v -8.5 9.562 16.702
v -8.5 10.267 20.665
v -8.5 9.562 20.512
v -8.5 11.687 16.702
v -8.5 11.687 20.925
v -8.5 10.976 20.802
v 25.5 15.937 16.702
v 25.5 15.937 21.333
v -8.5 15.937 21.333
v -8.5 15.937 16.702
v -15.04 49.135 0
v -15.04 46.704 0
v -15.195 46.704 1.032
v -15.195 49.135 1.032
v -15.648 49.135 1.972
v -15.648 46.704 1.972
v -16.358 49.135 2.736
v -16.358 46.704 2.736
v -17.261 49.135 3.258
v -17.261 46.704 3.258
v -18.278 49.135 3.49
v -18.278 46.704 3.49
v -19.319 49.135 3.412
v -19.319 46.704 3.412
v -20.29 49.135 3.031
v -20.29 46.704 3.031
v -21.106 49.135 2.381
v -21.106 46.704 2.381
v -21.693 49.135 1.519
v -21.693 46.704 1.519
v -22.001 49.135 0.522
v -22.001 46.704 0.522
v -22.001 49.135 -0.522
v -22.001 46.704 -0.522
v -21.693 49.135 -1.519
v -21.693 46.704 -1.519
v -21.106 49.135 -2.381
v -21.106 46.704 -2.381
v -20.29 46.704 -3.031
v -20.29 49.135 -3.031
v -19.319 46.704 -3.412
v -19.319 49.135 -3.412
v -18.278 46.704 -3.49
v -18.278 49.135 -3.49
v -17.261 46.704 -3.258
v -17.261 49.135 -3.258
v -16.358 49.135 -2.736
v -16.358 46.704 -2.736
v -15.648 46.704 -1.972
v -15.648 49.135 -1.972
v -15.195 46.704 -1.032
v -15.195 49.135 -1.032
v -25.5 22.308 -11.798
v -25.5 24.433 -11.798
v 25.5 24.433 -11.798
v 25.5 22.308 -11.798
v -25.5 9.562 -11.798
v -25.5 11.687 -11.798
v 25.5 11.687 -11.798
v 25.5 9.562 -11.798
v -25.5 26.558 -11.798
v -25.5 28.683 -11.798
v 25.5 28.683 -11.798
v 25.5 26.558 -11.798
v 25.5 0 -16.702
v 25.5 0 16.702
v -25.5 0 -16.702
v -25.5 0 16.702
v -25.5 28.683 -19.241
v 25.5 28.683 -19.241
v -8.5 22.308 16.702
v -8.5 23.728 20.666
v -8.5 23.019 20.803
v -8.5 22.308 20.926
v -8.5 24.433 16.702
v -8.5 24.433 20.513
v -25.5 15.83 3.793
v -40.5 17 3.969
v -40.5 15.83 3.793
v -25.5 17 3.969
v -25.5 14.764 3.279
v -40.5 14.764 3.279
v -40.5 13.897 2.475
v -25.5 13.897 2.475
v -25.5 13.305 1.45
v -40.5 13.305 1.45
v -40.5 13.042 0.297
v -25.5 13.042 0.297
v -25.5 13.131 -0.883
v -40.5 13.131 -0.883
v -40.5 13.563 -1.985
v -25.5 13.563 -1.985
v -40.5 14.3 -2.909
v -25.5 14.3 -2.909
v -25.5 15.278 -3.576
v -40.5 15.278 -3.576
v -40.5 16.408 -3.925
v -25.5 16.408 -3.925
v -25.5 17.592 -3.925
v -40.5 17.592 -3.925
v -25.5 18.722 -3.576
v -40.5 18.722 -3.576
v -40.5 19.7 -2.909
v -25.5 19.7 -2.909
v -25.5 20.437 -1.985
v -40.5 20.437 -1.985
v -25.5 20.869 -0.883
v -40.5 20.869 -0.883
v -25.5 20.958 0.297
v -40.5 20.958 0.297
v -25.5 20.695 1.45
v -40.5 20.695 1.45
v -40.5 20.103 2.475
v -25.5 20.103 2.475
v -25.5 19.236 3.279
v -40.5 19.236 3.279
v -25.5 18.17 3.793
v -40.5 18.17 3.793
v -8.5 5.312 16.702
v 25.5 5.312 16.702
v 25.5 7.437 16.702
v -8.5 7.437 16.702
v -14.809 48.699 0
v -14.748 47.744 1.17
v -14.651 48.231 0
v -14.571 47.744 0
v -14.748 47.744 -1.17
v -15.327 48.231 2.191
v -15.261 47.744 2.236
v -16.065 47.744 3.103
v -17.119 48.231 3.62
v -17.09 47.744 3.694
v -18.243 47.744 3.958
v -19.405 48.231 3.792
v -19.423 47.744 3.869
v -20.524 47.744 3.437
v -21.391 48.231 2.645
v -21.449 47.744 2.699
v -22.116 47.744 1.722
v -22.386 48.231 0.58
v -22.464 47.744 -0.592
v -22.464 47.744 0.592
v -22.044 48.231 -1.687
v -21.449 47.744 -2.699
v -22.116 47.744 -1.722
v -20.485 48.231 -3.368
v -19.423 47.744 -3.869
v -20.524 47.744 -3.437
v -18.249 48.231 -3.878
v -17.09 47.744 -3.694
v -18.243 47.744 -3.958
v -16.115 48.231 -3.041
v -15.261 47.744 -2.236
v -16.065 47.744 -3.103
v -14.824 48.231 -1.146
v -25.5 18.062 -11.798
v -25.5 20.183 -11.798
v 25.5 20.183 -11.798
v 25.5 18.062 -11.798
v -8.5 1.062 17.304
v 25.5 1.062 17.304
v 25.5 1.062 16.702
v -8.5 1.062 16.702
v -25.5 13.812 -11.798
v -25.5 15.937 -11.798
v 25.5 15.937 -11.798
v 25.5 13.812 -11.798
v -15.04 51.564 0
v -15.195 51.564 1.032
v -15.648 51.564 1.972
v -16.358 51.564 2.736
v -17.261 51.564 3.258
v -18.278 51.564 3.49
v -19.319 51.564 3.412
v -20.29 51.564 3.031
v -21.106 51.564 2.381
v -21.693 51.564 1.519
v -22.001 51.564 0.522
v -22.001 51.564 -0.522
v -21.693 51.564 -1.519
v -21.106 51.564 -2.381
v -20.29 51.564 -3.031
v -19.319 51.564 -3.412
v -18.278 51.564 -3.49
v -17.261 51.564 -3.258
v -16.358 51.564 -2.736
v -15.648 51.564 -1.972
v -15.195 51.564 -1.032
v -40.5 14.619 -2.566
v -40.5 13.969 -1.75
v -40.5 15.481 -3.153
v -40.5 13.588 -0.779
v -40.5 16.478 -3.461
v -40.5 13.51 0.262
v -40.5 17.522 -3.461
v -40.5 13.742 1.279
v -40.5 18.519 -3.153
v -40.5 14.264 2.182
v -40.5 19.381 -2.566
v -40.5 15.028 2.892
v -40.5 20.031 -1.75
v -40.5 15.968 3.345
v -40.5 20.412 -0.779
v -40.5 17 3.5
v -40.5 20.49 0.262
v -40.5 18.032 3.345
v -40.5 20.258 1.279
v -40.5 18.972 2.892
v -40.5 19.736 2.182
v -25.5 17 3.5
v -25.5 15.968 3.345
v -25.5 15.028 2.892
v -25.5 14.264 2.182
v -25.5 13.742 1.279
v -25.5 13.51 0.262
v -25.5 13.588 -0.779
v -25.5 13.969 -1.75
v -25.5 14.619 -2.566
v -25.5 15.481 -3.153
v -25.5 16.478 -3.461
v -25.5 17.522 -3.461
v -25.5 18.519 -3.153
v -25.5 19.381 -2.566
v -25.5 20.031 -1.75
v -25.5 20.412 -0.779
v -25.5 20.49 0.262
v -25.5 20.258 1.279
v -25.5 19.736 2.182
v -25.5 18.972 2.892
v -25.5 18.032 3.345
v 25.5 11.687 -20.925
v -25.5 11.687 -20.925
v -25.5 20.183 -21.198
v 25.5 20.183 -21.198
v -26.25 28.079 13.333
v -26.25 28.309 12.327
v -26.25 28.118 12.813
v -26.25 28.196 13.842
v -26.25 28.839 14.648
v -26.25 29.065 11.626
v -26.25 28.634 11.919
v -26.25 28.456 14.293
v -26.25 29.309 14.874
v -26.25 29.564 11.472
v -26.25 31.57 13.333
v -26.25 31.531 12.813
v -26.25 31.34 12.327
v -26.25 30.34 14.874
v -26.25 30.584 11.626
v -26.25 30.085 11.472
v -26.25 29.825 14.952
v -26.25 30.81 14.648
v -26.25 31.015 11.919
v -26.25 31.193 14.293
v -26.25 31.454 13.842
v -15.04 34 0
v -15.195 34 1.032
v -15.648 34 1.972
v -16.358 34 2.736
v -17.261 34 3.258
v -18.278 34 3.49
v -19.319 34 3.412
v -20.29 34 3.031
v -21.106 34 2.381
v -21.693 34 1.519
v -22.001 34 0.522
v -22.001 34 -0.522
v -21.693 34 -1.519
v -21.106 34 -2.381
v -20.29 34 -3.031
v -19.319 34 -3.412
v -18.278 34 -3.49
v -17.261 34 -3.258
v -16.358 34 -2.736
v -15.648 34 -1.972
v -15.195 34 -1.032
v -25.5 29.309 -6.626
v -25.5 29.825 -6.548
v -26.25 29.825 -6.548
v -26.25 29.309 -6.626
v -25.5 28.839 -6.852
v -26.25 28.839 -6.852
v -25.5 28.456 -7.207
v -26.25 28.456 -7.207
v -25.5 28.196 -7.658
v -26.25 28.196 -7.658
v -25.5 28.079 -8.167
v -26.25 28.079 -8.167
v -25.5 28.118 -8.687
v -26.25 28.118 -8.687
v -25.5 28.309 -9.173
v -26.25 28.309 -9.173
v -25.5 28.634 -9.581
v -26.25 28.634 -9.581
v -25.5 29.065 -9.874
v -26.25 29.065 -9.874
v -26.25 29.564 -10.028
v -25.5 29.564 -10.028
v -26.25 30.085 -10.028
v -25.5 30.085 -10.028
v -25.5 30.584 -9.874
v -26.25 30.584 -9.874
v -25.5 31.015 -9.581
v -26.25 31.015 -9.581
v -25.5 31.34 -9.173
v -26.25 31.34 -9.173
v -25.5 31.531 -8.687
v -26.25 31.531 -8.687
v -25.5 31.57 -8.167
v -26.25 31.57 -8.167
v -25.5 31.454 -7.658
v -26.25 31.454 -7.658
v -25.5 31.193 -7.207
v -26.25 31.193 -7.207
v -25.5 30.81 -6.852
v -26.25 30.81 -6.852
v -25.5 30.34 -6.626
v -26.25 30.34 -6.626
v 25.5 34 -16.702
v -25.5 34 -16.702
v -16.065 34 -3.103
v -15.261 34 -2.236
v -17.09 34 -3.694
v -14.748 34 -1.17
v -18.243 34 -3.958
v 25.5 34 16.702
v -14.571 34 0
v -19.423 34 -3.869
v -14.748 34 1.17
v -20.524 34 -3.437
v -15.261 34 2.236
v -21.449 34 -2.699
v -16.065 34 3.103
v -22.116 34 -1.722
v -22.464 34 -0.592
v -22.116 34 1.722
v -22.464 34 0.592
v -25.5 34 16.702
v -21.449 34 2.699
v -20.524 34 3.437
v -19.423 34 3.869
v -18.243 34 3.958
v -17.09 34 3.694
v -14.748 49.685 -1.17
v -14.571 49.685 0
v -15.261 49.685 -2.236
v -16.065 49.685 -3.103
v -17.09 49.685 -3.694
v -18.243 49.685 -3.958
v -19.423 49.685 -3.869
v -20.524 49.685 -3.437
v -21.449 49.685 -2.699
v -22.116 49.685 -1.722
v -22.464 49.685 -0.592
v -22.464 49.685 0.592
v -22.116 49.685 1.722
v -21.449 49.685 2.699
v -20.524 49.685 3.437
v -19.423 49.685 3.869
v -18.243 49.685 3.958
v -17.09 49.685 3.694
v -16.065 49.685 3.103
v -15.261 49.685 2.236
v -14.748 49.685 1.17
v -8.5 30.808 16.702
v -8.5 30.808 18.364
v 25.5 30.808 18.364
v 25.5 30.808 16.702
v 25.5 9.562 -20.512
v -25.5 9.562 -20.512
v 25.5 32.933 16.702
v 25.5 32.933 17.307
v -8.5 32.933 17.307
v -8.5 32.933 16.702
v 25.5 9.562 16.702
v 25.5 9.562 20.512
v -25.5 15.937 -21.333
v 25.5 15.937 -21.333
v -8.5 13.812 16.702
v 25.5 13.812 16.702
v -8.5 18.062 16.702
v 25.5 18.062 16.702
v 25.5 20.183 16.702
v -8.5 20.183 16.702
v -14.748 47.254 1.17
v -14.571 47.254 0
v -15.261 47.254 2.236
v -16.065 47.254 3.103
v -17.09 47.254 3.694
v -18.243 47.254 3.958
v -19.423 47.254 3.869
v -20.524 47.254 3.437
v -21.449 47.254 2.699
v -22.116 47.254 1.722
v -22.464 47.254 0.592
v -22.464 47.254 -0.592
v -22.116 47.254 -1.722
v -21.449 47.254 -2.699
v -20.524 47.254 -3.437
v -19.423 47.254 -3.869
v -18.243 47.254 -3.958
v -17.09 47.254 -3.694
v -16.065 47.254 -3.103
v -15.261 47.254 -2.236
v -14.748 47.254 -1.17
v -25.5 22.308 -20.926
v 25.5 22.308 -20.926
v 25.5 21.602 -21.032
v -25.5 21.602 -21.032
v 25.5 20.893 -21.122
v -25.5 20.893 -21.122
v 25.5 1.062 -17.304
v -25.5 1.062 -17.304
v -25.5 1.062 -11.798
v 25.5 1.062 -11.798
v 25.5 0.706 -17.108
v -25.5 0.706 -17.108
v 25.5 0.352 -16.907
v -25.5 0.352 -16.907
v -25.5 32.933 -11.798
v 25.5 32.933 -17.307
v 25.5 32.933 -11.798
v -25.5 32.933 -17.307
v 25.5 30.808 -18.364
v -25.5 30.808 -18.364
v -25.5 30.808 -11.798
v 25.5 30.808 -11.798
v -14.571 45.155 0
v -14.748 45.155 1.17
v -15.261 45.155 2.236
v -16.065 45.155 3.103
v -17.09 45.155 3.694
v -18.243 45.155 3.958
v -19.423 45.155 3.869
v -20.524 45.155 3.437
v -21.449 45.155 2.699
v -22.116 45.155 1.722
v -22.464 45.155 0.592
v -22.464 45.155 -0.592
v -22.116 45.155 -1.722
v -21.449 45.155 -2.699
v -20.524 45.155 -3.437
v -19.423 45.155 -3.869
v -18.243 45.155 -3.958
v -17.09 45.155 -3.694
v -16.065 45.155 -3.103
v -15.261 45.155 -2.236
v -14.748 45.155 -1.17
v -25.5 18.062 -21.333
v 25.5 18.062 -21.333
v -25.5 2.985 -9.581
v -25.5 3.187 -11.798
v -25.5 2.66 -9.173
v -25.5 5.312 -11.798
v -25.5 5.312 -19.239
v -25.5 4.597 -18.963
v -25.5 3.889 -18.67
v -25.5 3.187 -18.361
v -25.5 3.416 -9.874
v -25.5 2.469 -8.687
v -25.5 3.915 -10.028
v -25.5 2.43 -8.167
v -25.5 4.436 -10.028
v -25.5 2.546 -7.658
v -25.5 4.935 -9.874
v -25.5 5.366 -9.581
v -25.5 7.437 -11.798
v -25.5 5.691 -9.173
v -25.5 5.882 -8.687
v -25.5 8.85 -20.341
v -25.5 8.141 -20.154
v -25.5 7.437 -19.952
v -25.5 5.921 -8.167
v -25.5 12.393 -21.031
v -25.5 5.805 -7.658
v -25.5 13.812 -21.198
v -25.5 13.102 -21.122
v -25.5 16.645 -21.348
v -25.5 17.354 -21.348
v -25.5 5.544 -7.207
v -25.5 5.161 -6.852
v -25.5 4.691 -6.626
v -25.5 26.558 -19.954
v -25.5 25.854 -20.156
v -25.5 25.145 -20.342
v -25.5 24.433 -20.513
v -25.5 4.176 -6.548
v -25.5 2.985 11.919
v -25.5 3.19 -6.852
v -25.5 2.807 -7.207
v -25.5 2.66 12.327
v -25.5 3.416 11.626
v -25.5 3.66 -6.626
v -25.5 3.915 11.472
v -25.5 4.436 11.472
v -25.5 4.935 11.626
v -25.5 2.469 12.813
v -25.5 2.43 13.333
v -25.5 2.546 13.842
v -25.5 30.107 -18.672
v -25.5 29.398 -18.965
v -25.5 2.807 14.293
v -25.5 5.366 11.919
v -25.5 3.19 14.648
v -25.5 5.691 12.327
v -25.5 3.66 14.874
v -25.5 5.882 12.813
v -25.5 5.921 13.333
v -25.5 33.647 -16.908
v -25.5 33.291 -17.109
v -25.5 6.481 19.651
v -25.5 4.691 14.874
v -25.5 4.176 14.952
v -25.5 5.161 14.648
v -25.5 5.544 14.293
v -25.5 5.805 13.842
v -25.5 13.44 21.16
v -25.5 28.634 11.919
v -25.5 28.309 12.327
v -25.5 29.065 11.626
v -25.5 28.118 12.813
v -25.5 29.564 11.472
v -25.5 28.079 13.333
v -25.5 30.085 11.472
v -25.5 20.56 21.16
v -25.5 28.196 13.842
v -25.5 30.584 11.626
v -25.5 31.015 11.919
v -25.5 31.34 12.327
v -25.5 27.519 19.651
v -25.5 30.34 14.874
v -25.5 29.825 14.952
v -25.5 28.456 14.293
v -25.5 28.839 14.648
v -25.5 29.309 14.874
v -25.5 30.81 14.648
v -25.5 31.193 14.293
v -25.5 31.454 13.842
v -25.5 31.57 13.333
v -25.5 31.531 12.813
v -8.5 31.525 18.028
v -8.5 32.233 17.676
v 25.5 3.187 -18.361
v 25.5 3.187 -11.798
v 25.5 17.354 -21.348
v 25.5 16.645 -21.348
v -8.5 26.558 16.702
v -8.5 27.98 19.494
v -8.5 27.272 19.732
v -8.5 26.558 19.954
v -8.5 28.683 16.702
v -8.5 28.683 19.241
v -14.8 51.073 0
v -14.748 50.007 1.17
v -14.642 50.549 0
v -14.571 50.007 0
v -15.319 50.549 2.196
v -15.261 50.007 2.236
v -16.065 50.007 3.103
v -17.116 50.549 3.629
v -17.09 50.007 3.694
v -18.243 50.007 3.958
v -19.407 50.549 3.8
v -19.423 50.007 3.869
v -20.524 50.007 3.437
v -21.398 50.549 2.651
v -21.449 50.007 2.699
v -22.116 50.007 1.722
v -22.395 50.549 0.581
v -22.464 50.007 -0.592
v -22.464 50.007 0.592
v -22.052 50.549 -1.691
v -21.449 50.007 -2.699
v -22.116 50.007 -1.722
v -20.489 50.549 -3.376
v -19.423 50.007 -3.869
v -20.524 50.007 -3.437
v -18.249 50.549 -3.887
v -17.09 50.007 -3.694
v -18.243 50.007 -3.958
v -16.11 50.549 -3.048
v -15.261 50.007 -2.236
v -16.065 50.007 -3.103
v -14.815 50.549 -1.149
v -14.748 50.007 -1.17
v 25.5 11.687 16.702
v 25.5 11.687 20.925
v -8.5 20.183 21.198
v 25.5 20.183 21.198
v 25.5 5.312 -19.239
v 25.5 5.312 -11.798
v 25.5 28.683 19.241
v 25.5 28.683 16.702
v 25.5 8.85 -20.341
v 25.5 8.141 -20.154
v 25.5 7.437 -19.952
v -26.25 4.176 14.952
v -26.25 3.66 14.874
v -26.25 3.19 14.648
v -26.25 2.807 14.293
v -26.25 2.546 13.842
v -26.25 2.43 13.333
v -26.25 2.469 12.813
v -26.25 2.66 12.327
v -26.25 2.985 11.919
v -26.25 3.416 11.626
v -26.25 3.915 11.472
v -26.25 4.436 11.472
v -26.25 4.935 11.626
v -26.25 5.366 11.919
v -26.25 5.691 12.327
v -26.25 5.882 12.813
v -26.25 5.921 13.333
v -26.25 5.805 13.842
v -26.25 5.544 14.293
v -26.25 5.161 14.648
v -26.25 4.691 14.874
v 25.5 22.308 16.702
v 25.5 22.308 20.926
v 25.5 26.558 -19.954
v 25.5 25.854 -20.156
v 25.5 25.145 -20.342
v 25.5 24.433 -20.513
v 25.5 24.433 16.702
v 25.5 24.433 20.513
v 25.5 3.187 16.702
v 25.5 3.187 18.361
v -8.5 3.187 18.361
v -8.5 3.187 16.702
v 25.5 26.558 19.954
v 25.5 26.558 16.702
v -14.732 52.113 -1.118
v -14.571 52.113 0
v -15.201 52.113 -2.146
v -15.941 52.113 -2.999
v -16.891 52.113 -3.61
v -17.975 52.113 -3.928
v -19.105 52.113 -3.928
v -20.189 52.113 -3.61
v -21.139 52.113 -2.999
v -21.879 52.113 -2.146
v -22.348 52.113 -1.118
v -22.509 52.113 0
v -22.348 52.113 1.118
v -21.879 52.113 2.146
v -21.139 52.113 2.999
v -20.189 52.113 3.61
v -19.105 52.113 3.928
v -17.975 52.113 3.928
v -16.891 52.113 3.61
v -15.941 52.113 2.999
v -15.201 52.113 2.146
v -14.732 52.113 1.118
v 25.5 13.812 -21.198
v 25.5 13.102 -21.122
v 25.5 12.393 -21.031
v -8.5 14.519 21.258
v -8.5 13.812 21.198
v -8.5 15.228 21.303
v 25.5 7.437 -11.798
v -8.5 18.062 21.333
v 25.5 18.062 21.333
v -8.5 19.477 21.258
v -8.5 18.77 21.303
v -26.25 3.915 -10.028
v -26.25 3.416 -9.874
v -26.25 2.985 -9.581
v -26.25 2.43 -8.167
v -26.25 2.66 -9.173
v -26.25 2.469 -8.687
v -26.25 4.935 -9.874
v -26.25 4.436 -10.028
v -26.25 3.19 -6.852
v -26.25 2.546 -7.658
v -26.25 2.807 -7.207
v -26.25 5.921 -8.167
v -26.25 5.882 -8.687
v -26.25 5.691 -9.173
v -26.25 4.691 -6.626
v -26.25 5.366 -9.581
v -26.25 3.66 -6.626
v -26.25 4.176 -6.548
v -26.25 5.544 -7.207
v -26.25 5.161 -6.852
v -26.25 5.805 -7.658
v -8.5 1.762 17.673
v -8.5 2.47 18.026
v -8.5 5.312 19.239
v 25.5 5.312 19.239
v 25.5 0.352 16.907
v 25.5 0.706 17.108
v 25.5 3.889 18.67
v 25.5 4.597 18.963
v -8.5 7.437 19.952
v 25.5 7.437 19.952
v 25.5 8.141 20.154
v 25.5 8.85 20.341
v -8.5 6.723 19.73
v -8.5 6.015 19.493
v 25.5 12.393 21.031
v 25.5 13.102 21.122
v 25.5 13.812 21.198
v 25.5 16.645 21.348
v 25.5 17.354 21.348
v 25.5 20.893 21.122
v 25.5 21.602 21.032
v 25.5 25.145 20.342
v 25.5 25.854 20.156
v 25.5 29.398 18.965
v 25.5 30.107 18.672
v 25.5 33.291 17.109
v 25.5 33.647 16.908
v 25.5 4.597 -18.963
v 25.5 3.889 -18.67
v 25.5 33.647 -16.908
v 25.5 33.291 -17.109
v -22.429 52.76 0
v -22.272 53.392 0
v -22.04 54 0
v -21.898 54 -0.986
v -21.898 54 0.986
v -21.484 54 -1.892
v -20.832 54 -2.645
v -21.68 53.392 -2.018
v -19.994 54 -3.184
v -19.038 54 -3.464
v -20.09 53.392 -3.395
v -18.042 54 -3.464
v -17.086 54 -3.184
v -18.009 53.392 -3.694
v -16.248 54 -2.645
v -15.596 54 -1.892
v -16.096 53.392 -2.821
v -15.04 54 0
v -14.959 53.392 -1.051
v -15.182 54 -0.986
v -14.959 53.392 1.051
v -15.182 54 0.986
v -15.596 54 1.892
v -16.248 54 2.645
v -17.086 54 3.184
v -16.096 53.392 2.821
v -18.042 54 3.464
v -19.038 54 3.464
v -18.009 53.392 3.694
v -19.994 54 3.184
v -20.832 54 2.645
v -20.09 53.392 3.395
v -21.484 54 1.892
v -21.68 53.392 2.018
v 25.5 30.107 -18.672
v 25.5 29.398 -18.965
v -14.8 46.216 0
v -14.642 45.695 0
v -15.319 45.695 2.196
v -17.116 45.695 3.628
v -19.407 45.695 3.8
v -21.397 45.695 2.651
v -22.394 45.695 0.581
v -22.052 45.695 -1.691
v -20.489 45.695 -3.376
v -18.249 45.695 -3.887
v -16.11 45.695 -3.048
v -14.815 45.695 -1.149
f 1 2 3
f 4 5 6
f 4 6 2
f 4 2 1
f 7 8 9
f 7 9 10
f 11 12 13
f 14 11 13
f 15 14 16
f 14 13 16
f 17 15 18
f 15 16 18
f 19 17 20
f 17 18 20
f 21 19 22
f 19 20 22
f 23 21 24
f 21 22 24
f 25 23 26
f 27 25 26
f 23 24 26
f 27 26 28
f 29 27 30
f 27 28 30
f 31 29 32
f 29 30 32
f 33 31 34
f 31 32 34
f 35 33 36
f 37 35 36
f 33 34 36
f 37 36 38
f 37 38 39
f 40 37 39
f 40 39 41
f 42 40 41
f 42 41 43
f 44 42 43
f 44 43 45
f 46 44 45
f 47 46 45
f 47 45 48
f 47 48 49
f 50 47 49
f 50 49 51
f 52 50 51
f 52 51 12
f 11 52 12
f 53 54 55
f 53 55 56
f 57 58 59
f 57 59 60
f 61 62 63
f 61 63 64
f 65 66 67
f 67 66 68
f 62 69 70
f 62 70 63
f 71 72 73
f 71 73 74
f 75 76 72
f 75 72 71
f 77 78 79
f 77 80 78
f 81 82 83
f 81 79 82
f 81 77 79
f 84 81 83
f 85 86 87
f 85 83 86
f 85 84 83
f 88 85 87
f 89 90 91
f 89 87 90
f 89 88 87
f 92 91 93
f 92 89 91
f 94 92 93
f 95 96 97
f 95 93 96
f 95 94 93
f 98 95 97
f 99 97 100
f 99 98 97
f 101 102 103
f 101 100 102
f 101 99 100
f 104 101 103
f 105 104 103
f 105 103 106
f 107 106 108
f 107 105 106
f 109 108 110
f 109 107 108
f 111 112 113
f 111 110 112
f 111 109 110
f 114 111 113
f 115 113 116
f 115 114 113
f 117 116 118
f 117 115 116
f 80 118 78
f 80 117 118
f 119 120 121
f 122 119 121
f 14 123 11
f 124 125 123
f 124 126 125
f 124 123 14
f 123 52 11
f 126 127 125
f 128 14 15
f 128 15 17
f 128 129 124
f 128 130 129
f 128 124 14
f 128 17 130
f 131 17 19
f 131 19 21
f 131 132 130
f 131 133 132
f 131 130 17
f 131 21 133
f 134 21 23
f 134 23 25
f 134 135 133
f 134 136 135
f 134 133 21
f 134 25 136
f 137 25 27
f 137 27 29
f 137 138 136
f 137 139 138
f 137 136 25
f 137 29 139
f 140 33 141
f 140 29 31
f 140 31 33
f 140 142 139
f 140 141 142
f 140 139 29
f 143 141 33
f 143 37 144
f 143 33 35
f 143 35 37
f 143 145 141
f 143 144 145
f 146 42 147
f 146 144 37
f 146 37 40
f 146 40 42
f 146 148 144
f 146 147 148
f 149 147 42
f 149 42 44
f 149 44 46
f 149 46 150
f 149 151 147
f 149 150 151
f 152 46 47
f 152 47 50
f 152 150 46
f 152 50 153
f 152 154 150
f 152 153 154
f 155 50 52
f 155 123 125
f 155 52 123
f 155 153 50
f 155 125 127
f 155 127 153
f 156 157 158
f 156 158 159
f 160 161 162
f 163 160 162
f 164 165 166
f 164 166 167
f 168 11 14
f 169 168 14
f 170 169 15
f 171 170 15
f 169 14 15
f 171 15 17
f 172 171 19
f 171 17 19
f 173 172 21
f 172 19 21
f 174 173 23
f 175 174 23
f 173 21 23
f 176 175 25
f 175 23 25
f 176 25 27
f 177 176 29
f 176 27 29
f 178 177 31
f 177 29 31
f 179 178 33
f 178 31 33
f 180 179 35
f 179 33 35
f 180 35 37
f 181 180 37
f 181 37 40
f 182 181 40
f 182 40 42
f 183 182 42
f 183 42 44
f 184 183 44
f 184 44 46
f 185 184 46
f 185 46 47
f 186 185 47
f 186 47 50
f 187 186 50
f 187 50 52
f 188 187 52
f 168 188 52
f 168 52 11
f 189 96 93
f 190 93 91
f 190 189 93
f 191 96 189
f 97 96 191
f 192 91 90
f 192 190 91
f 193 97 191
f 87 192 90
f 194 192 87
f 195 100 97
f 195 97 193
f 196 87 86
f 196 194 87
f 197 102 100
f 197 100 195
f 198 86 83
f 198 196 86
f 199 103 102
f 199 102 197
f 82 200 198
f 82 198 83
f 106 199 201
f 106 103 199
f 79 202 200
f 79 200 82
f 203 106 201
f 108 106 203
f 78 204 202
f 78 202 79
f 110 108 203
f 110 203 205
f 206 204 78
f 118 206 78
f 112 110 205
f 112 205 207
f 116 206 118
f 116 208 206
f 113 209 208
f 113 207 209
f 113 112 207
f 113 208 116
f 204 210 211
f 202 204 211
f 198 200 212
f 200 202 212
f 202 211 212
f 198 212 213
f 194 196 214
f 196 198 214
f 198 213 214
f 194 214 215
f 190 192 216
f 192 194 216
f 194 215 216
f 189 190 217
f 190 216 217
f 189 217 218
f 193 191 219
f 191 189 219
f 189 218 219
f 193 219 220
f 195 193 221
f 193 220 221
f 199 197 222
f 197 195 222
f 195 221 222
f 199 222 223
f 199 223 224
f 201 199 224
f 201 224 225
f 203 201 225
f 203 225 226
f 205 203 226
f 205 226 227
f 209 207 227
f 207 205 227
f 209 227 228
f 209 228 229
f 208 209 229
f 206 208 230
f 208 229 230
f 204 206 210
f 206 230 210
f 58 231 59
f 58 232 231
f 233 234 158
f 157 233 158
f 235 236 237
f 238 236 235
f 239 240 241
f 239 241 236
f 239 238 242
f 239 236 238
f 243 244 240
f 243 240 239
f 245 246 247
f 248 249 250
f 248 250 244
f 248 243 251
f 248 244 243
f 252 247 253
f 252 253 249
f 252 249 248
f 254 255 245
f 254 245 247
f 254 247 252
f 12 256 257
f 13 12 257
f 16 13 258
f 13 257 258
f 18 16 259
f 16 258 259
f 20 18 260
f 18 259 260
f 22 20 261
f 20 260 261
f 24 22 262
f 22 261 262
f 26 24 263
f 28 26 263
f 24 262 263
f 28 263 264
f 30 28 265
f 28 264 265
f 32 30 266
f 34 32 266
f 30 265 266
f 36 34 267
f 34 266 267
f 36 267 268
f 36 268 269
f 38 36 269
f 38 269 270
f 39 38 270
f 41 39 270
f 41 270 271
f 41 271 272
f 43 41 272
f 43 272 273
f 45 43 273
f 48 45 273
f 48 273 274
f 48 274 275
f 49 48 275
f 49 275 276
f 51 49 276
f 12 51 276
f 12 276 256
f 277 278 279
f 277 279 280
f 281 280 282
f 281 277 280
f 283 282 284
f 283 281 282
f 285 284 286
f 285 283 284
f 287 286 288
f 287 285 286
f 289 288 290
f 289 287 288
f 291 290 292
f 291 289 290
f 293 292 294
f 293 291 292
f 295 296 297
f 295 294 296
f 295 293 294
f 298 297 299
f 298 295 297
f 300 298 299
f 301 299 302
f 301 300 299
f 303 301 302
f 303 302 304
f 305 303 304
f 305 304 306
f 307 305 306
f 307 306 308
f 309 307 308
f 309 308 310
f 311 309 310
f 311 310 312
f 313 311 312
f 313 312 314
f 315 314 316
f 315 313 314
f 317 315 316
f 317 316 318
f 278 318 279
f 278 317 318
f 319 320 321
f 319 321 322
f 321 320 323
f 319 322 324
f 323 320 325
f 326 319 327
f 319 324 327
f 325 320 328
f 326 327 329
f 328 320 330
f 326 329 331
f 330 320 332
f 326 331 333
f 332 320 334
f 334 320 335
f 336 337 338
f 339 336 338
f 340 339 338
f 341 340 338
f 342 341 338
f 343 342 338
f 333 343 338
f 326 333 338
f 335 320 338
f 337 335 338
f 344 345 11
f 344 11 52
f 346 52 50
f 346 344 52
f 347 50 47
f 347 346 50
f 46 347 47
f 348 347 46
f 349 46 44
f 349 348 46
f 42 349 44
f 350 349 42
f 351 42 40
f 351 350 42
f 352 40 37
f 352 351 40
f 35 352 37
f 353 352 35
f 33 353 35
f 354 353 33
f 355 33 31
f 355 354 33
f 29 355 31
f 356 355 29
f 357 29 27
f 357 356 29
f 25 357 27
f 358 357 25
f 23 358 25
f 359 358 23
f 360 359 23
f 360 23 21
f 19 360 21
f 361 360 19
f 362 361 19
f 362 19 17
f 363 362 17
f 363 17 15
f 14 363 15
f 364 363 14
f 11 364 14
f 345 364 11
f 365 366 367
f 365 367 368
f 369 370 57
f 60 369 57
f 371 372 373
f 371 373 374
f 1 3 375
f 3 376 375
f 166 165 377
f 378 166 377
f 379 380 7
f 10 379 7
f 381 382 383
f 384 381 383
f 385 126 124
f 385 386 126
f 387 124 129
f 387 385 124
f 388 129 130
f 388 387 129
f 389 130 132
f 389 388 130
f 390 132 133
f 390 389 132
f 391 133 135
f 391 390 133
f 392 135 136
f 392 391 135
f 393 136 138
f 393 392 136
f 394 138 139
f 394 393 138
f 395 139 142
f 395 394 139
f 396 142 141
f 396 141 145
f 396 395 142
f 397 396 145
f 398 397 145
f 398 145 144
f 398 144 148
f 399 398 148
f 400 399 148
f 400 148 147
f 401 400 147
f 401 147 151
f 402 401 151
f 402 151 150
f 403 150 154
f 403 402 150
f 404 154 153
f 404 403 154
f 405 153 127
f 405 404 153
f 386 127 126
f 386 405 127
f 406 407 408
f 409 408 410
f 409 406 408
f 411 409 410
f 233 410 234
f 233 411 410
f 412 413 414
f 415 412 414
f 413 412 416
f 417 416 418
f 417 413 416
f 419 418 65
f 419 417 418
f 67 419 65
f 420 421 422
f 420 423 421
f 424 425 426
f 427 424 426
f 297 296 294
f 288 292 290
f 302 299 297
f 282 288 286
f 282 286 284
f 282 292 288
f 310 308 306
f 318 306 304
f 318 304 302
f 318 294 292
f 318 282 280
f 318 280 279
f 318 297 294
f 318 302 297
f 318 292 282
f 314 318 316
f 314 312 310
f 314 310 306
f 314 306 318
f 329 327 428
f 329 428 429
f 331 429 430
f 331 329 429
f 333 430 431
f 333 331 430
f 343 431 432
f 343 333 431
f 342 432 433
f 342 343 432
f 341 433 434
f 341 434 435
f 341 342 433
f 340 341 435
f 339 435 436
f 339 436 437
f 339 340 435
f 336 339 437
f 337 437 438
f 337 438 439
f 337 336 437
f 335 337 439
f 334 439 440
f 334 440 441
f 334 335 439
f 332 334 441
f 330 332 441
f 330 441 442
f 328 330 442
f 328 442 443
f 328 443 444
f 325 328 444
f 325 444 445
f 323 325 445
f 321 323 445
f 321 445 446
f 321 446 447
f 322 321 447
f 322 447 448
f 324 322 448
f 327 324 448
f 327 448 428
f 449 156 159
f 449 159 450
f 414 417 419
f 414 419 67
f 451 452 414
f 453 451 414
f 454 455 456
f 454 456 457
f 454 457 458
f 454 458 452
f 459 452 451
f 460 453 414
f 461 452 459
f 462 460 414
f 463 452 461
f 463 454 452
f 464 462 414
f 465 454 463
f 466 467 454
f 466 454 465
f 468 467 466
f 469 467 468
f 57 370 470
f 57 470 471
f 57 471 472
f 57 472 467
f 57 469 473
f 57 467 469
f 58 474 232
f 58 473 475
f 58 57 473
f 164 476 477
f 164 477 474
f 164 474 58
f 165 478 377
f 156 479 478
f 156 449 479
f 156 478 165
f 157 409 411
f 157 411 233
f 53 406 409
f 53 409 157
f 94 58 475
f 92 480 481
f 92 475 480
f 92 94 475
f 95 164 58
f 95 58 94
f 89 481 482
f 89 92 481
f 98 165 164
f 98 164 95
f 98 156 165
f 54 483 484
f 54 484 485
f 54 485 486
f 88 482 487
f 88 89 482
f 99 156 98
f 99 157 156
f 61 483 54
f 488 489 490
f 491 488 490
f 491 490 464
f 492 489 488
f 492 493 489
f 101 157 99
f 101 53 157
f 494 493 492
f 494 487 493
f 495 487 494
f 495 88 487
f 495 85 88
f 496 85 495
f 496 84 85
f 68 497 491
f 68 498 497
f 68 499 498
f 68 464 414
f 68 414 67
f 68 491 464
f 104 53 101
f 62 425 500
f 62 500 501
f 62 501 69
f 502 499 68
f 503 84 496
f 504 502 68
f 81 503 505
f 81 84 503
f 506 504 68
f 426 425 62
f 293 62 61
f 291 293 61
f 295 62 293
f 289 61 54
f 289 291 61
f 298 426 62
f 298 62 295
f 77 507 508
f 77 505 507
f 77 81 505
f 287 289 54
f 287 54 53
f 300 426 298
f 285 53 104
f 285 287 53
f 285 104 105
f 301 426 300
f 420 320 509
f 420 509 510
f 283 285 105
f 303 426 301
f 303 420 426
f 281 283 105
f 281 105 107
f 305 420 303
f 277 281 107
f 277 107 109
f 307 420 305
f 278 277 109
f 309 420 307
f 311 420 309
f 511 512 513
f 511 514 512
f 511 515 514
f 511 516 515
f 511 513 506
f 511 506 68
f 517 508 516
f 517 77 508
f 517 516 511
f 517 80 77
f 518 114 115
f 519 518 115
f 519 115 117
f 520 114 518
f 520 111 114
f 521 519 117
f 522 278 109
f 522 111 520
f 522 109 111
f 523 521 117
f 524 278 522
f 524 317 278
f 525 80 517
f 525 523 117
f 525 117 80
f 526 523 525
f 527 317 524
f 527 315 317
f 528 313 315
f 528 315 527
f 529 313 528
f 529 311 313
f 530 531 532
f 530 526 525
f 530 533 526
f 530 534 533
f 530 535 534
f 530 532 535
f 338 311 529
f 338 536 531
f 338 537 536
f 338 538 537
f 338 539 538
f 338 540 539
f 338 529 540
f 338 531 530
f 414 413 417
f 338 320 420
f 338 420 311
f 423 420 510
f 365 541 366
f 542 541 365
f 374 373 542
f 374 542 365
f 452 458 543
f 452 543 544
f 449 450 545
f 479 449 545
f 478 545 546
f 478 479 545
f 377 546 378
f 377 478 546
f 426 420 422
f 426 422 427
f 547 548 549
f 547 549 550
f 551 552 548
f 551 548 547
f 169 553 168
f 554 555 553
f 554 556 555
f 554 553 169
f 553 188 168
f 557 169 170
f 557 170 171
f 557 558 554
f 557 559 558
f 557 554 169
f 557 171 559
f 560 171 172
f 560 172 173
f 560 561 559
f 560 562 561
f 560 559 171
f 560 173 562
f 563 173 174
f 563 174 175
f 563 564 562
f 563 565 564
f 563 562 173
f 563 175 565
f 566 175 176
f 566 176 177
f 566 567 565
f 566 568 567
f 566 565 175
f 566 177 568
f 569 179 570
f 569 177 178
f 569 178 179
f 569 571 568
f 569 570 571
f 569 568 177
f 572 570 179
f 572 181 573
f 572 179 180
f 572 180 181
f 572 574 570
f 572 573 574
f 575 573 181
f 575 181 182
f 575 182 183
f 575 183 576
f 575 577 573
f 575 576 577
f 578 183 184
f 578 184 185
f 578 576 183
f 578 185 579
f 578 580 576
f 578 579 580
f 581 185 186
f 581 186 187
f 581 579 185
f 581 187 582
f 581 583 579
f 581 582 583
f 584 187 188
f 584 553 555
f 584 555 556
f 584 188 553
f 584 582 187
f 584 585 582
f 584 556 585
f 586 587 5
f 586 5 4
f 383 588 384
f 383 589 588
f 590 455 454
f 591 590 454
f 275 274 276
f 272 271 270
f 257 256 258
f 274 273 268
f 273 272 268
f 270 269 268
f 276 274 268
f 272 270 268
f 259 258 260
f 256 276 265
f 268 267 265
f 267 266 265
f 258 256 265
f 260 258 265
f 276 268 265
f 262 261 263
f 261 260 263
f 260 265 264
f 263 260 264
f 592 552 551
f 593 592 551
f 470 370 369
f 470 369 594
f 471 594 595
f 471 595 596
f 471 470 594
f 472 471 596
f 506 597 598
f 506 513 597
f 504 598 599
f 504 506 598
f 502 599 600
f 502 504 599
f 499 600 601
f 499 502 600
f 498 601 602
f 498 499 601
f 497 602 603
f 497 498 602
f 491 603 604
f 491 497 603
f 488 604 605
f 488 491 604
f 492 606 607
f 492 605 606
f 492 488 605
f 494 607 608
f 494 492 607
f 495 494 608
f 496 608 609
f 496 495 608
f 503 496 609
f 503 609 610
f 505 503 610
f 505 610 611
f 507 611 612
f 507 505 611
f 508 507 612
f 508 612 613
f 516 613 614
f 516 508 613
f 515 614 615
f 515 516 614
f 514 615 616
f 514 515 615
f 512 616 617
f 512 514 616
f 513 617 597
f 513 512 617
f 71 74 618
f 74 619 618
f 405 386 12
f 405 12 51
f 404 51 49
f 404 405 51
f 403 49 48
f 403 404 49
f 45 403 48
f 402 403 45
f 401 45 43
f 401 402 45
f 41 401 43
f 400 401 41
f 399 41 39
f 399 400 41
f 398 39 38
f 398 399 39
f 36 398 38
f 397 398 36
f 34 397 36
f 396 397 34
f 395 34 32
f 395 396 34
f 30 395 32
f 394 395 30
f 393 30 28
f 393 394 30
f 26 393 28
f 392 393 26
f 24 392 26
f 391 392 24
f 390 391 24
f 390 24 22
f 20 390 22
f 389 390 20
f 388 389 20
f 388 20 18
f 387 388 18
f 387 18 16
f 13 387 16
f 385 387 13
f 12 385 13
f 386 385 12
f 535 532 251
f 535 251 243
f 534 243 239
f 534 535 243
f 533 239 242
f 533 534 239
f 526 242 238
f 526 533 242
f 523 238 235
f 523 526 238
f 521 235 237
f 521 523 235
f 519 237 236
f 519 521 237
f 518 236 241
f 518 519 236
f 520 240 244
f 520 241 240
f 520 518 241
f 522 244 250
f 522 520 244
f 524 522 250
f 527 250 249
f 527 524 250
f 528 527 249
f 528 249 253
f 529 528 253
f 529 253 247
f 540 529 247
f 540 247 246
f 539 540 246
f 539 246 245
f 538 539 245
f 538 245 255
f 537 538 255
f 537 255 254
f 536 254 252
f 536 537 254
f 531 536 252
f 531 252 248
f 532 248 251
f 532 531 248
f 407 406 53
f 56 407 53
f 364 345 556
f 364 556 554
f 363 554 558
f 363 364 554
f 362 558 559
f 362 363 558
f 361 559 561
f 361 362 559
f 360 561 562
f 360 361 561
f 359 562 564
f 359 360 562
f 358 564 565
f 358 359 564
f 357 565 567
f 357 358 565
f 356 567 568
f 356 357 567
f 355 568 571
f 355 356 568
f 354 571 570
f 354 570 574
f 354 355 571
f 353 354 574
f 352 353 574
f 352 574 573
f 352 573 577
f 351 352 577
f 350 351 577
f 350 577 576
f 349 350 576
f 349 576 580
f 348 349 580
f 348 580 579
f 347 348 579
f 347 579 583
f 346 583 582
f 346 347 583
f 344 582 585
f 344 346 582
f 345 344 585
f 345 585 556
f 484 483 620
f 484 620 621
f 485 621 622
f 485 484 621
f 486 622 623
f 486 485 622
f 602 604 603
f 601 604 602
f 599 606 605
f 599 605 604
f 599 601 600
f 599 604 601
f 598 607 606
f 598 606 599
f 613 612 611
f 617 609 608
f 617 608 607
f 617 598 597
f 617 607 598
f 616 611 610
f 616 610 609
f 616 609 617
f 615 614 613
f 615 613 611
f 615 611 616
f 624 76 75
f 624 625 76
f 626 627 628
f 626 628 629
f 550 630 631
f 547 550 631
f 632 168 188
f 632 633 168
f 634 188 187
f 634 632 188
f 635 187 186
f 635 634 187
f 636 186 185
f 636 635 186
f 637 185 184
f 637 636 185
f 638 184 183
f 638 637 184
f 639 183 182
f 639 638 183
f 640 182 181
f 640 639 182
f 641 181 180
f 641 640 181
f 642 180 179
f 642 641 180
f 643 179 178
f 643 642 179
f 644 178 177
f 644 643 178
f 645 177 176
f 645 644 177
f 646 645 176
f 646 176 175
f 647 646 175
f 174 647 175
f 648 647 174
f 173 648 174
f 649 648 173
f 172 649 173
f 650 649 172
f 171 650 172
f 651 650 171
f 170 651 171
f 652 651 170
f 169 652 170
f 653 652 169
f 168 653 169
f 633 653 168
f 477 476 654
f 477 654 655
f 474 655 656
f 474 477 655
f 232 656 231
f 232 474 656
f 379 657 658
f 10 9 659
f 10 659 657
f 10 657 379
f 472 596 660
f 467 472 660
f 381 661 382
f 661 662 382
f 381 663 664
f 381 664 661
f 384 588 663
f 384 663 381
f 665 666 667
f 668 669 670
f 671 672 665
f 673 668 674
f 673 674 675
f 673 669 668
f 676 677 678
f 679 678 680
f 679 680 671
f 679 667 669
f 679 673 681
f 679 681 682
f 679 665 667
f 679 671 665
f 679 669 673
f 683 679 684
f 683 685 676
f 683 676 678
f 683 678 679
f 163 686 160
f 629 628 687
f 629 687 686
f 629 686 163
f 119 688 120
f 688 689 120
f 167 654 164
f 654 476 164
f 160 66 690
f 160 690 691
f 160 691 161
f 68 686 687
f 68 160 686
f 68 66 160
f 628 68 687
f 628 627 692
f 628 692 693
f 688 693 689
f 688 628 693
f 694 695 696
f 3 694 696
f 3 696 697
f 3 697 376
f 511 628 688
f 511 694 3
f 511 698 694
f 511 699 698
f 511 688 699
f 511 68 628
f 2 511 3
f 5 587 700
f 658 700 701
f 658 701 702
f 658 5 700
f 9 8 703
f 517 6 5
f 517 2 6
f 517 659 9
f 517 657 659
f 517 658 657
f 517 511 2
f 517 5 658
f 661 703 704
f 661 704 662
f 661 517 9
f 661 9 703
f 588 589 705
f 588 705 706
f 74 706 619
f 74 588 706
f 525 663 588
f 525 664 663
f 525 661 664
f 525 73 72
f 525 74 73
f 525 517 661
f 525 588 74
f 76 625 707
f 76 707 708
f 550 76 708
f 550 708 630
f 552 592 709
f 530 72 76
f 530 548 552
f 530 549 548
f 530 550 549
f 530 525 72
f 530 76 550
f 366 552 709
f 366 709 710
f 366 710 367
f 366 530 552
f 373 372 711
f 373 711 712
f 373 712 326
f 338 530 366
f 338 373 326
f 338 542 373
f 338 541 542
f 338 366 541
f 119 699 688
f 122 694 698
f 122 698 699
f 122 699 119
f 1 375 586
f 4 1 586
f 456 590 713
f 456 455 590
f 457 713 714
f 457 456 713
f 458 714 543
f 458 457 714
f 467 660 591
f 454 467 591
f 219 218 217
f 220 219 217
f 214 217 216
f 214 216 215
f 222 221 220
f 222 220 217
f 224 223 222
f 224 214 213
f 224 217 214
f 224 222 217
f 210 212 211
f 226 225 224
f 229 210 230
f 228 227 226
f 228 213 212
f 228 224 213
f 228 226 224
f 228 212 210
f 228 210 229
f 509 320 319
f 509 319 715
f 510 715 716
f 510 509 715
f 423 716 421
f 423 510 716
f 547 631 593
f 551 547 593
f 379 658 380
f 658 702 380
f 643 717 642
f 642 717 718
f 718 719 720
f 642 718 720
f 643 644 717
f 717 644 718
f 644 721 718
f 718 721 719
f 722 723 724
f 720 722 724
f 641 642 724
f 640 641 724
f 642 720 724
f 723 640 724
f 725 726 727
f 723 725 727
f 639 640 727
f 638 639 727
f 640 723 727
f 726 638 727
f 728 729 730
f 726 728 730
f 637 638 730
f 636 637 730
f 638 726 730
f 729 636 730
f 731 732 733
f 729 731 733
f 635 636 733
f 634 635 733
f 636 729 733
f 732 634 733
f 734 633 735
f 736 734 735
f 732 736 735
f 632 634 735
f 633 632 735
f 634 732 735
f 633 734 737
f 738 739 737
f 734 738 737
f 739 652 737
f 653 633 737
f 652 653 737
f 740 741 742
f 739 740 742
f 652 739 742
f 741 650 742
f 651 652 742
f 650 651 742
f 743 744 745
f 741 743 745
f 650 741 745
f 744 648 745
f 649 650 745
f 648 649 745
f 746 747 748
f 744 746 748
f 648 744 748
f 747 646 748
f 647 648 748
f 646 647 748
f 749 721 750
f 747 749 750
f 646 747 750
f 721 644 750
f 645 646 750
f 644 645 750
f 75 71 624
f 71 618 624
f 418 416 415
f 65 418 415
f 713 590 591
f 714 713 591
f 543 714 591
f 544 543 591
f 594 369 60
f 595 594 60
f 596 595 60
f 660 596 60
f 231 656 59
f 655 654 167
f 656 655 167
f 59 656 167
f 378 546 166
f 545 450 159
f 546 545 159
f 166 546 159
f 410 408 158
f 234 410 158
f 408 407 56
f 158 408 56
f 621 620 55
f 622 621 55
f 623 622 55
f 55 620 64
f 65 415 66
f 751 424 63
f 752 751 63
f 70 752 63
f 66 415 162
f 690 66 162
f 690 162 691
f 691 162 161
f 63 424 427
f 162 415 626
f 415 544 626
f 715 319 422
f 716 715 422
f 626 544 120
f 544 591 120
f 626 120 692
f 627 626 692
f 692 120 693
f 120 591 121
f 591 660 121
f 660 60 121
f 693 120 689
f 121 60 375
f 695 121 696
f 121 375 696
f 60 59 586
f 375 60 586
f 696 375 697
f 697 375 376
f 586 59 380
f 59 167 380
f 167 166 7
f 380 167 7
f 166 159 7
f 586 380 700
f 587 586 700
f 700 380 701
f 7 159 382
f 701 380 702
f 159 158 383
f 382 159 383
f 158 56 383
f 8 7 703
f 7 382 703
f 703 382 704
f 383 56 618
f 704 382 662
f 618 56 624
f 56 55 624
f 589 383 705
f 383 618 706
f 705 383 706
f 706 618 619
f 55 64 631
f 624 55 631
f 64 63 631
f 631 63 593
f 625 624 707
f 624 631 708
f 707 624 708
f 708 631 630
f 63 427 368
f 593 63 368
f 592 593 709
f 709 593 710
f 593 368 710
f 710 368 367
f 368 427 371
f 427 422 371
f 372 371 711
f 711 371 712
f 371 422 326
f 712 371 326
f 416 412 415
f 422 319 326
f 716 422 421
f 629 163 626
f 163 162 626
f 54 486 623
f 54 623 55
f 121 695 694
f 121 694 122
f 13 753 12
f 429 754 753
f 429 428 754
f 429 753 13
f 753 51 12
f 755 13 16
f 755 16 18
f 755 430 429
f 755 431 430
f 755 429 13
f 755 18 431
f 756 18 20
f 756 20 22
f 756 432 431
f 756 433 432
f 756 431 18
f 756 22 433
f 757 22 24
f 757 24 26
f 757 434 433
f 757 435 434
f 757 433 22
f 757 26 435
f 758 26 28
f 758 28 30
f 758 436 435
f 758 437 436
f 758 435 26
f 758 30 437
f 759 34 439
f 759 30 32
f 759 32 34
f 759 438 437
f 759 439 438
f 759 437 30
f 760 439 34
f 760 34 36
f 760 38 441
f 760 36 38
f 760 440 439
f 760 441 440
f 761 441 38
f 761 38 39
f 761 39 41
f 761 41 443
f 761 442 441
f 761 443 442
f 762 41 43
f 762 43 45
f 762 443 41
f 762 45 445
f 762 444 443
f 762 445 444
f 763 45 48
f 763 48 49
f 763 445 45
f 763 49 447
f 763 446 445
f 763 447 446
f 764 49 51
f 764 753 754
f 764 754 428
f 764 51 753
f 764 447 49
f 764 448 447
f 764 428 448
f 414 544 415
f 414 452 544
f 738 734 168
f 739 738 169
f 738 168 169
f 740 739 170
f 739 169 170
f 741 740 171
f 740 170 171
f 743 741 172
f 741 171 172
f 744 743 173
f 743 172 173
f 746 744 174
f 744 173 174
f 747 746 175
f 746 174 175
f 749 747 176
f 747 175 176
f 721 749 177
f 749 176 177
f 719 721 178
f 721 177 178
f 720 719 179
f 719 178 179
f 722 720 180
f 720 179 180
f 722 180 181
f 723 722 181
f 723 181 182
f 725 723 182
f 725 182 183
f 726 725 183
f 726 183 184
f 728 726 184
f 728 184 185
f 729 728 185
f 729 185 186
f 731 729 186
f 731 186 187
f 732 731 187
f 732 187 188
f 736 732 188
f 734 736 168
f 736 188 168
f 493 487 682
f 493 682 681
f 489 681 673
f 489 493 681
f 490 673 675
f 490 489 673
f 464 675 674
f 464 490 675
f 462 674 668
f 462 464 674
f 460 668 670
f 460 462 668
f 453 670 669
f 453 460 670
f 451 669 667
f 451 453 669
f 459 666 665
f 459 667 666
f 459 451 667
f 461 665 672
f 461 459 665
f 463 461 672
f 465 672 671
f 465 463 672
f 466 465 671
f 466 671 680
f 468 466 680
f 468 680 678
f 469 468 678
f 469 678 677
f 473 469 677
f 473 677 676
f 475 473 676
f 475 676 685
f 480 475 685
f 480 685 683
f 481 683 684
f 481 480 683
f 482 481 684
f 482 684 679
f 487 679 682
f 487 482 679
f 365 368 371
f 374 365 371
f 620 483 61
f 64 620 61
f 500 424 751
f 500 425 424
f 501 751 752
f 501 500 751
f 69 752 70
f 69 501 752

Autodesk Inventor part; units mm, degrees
ref_plane "YZ Plane" through (0, 0, 0) normal (1, 0, 0) x (0, 1, 0)
ref_plane "XZ Plane" through (0, 0, 0) normal (0, 1, 0) x (-1, 0, 0)
sketch "Sketch1" plane through (0, 0, 0) normal (0, 1, 0) x (-1, 0, 0)
  line L0 (25.5, -21.35) -> (-25.5, -21.35)
  line L1 (-25.5, -21.35) -> (-25.5, 21.35)
  line L2 (-25.5, 21.35) -> (25.5, 21.35)
  line L3 (25.5, 21.35) -> (25.5, -21.35)
  line L4 (25.5, -21.35) -> (-25.5, 21.35) construction
  line L5 (-25.5, -21.35) -> (25.5, 21.35) construction
  point P0 (0, 0)
  dimension "d0" = 51
  dimension "d1" = 42.7
extrude "Extrusion1" add sketch "Sketch1" along normal blind 34
sketch "Sketch2" plane through (-25.5, 0, -21.35) normal (-1, 0, 0) x (0, 0, 1)
  line L0 (42.7, 0) -> (0, 0) projected
  line L1 (42.7, 0) -> (42.7, 34) projected
  line L2 (0, 34) -> (42.7, 34) projected
  line L3 (0, 0) -> (0, 34) projected
  arc A0 (38.0522, 0) -> (38.0522, 34) centre (9.2864, 17) ccw
  line L4 (0, 34) -> (42.7, 34) construction
  line L5 (21.35, 34) -> (21.35, 0) construction
  arc A1 (4.6478, 34) -> (4.6478, 0) centre (33.4136, 17) ccw
  line L6 (0, 17) -> (42.7, 17) construction
  line L7 (42.7, 0) -> (0, 0) construction
  line L8 (9.5522, 34) -> (9.5522, 0) construction
  line L9 (9.5522, 34) -> (9.5522, 0)
  line L10 (0, 0) -> (0, 34) construction
  line L11 (0.0169, 18.0624) -> (9.5522, 18.0624) construction
  line L12 (9.5522, 15.937) -> (0, 15.937) construction
  line L13 (9.5522, 18.0624) -> (0.0169, 18.0624)
  line L14 (9.5522, 15.937) -> (0.0169, 15.937)
  line L15 (0.152, 20.1831) -> (9.5522, 20.1831)
  line L16 (0.4243, 22.3081) -> (9.5522, 22.3081)
  line L17 (0.8373, 24.4331) -> (9.5522, 24.4331)
  line L18 (1.3962, 26.5581) -> (9.5522, 26.5581)
  line L19 (2.1091, 28.6831) -> (9.5522, 28.6831)
  line L20 (2.9865, 30.8081) -> (9.5522, 30.8081)
  line L21 (4.0434, 32.9331) -> (9.5522, 32.9331)
  line L22 (0.1524, 13.812) -> (9.5522, 13.812)
  line L23 (0.4251, 11.687) -> (9.5522, 11.687)
  line L24 (0.8384, 9.562) -> (9.5522, 9.562)
  line L25 (1.3977, 7.437) -> (9.5522, 7.437)
  line L26 (2.1109, 5.312) -> (9.5522, 5.312)
  line L27 (2.9888, 3.187) -> (9.5522, 3.187)
  line L28 (4.0461, 1.062) -> (9.5522, 1.062)
  line L29 (9.5522, 34) -> (0, 34)
  line L30 (0, 34) -> (0, 0)
  line L31 (0, 0) -> (4.6478, 0)
  line L32 (42.7, 0) -> (42.7, 34) projected
  line L33 (42.7, 0) -> (42.7, 34)
  line L34 (42.7, 34) -> (9.5522, 34)
  line L35 (42.7, 0) -> (0, 0)
  line L36 (4.6478, 34) -> (4.0434, 32.9331)
  dimension "d4" = 28.5
  dimension "d5" = 1.0625
  dimension "d6" = 1.063
  dimension "d7" = 2.125
  dimension "d8" = 2.125
  dimension "d9" = 2.125
  dimension "d10" = 2.125
  dimension "d11" = 2.125
  dimension "d12" = 2.125
  dimension "d13" = 2.125
  dimension "d14" = 2.125
  dimension "d15" = 2.125
  dimension "d16" = 2.125
  dimension "d17" = 2.125
  dimension "d18" = 2.125
  dimension "d19" = 2.125
  dimension "d20" = 2.125
  dimension "d21" = 1.062
  dimension "d22" = 1.0669
extrude "Extrusion2" cut sketch "Sketch2" against normal through all contours L0 L3 A1 | L28 A1 L27 L9 | L9 L21 L36 L2 | A1 L3 L2 | L9 L20 A1 L21 | L26 A1 L25 L9 | A1 L15 L9 L13 | L14 L9 L22 A1 | L9 L18 A1 L19 | L24 A1 L23 L9 | A1 L17 L9 L16
sketch "Sketch3" plane through (-25.5, 0, 21.35) normal (-1, 0, 0) x (0, 0, 1)
  line L0 (-38.6566, 32.9331) -> (-33.1478, 32.9331)
  line L1 (-33.1478, 34) -> (-33.1478, 30.8081) projected
  line L2 (0, 34) -> (-33.1478, 34) projected
  line L3 (-38.0522, 34) -> (-33.1478, 34)
  line L4 (-33.1478, 34) -> (-33.1478, 32.9331)
  arc A0 (-38.0522, 34) -> (-38.6566, 32.9331) centre (-9.2864, 17) ccw projected
  line L5 (-38.0522, 34) -> (-38.0522, 34)
  line L6 (-38.0522, 34) -> (-38.6566, 32.9331)
  point P0 (-21.35, 0)
extrude "Extrusion3" add sketch "Sketch3" against normal blind 51 contours L6 L3 L1 L0
sketch "Sketch4" plane through (-25.5, 0, 21.35) normal (0, 0, 1) x (1, 0, 0)
  line L0 (51, 34) -> (0, 34) projected
  line L1 (17, 34) -> (17, 0)
  line L2 (0, 0) -> (51, 0) projected
  line L3 (0, 30.8081) -> (51, 30.8081) projected
  line L4 (0, 28.6831) -> (51, 28.6831) projected
  line L5 (0, 26.5581) -> (51, 26.5581) projected
  line L6 (0, 24.4331) -> (51, 24.4331) projected
  line L7 (0, 22.3081) -> (51, 22.3081) projected
  line L8 (0, 20.1831) -> (51, 20.1831) projected
  line L9 (0, 18.0624) -> (51, 18.0624) projected
  line L10 (51, 15.937) -> (0, 15.937) projected
  line L11 (51, 0) -> (0, 0) projected
  line L12 (51, 0) -> (51, 34) projected
  line L13 (0, 34) -> (51, 34) projected
  line L14 (0, 0) -> (0, 34) projected
  line L15 (0, 13.812) -> (51, 13.812) projected
  line L16 (0, 11.687) -> (51, 11.687) projected
  line L17 (0, 9.562) -> (51, 9.562) projected
  line L18 (0, 7.437) -> (51, 7.437) projected
  line L19 (0, 5.312) -> (51, 5.312) projected
  line L20 (0, 3.187) -> (51, 3.187) projected
  line L21 (0, 1.062) -> (51, 1.062) projected
  line L22 (0, 32.9331) -> (51, 32.9331) projected
  line L23 (17, 34) -> (51, 34)
  line L24 (51, 34) -> (51, 0)
  line L25 (51, 1.062) -> (51, 3.187) projected
  line L26 (51, 0) -> (51, 1.062) projected
  line L27 (51, 0) -> (17, 0)
  line L28 (17, 1.062) -> (51, 1.062)
  line L29 (51, 3.187) -> (51, 5.312) projected
  line L30 (51, 3.187) -> (17, 3.187)
  line L31 (17, 5.312) -> (51, 5.312)
  line L32 (51, 5.312) -> (51, 7.437)
  line L33 (51, 7.437) -> (17, 7.437)
  line L34 (51, 7.437) -> (51, 9.562) projected
  line L35 (17, 9.562) -> (51, 9.562)
  line L36 (51, 9.562) -> (51, 11.687)
  line L37 (51, 11.687) -> (51, 13.812) projected
  line L38 (17, 11.687) -> (51, 11.687)
  line L39 (51, 11.687) -> (51, 13.812)
  line L40 (51, 13.812) -> (17, 13.812)
  line L41 (0, 13.812) -> (51, 13.812) projected
  line L42 (0, 15.937) -> (51, 15.937) projected
  line L43 (51, 15.937) -> (51, 18.0624) projected
  line L44 (17, 15.937) -> (51, 15.937)
  line L45 (51, 15.937) -> (51, 18.0624)
  line L46 (51, 18.0624) -> (17, 18.0624)
  line L47 (17, 20.1831) -> (51, 20.1831)
  line L48 (51, 22.3081) -> (17, 22.3081)
  line L49 (17, 24.4331) -> (51, 24.4331)
  line L50 (51, 26.5581) -> (17, 26.5581)
  line L51 (0, 26.5581) -> (51, 26.5581) projected
  line L52 (51, 28.6831) -> (51, 30.8081) projected
  line L53 (17, 28.6831) -> (51, 28.6831)
  line L54 (51, 28.6831) -> (51, 30.8081)
  line L55 (51, 30.8081) -> (17, 30.8081)
  line L56 (51, 30.8081) -> (51, 32.9331) projected
  line L57 (17, 32.9331) -> (51, 32.9331)
  point P0 (25.5, 0)
  dimension "d27" = 17
extrude "Extrusion4" cut sketch "Sketch2" against normal blind 51 contours L0 A0 L1 | A0 L2 L1
sketch "Sketch5" plane through (25.5, 18.0624, -11.7978) normal (1, 0, 0) x (0, 0, -1)
  arc A0 (-28.5, 15.9376) -> (-28.5, -18.0624) centre (0.2657, -1.0624) ccw projected
  line L0 (-28.5, -18.0624) -> (-28.5, 15.9376)
  line L1 (-33.1478, -18.0624) -> (-33.1478, 15.9376) projected
  line L2 (-29.1017, -17.0004) -> (-28.5, -17.0004)
  line L3 (-30.1591, -14.8754) -> (-28.5, -14.8754)
  line L4 (-31.037, -12.7504) -> (-28.5, -12.7504)
  line L5 (-31.7501, -10.6254) -> (-28.5, -10.6254)
  line L6 (-32.3095, -8.5004) -> (-28.5, -8.5004)
  line L7 (-32.7227, -6.3754) -> (-28.5, -6.3754)
  line L8 (-32.9954, -4.2504) -> (-28.5, -4.2504)
  line L9 (-33.1309, -2.1254) -> (-28.5, -2.1254)
  line L10 (-33.131, 0) -> (-28.5, 0)
  line L11 (-32.9959, 2.1207) -> (-28.5, 2.1207)
  line L12 (-32.7235, 4.2457) -> (-28.5, 4.2457)
  line L13 (-32.3106, 6.3707) -> (-28.5, 6.3707)
  line L14 (-31.7516, 8.4957) -> (-28.5, 8.4957)
  line L15 (-31.0388, 10.6207) -> (-28.5, 10.6207)
  line L16 (-30.1613, 12.7457) -> (-28.5, 12.7457)
  line L17 (-29.1044, 14.8707) -> (-28.5, 14.8707)
  line L18 (-33.131, 0) -> (-28.5, 0)
  line L19 (-33.131, 0) -> (-28.5, 0)
  point P0 (-11.7978, -18.0624)
  point P1 (-33.1478, -12.7504)
  point P2 (-33.1478, -10.6254)
  point P3 (-33.1478, -8.5004)
  point P4 (-33.1478, -6.3754)
  point P5 (-33.1478, -4.2504)
  point P6 (-33.1478, -2.1254)
  point P7 (-33.1478, 0)
  point P8 (-33.1478, 2.1207)
  point P9 (-33.1478, 4.2457)
  point P10 (-33.1478, 6.3707)
  point P11 (-33.1478, 8.4957)
  point P12 (-33.1478, 10.6207)
  point P13 (-33.1478, 12.7457)
  point P14 (-33.1478, 14.8707)
  point P15 (-33.1478, -14.8754)
  point P16 (-33.1478, -17.0004)
extrude "Extrusion5" cut sketch "Sketch5" against normal blind 34 contours L17 L0 L16 A0 | L15 L0 L14 A0 | L13 L0 L12 A0 | L11 L0 L10 A0 | L0 L8 A0 L9 | L0 L6 A0 L7 | L0 L4 A0 L5 | L0 L2 A0 L3
sketch "Sketch6" plane through (0, 34, 0) normal (0, 1, 0) x (1, 0, 0)
  line L0 (-25.5, 16.7022) -> (25.5, 16.7022) construction
  line L1 (-18.54, 16.7022) -> (-18.54, -16.7022) construction
  line L2 (25.5, -16.7022) -> (-25.5, -16.7022) construction
  line L3 (-25.5, 16.7022) -> (-25.5, -16.7022) construction
  circle A0 centre (-18.54, 0) radius 3.9688 construction
  circle A1 centre (-18.54, 0) radius 5.5563 construction
  circle A2 centre (-18.54, 0) radius 3.5 construction
  circle A3 centre (-18.54, 0) radius 3.5
  circle A4 centre (-18.54, 0) radius 3.9688
  point P0 (0, 0)
  dimension "d32" = 6.96
  dimension "d33" = 7.9375
  dimension "d34" = 11.1125
  dimension "d35" = 7
extrude "Extrusion6" add sketch "Sketch6" along normal blind 20
ref_plane "Work Plane3" through (-18.54, 34, 0) normal (0, 0, -1) x (-1, 0, 0)
ref_plane "Work Plane1" through (-18.54, 34, 3.9688) normal (0, 0, -1) x (-1, 0, 0)
ref_plane "Work Plane2" through (-18.54, 34, -3.9688) normal (0, 0, -1) x (-1, 0, 0)
sketch "Sketch7" plane through (-18.54, 34, 0) normal (0, 0, -1) x (-1, 0, 0)
  line L0 (3.9688, 20) -> (-3.9688, 20) projected
  line L1 (-3.9688, 0) -> (3.9688, 0) projected
  line L2 (3.9688, 20) -> (-3.9688, 20) projected
  line L3 (-3.9688, 0) -> (3.9688, 0) projected
  line L4 (3.9688, 20) -> (-3.9688, 20) projected
  line L5 (3.5, 0) -> (3.5, 20) projected
  line L6 (3.5, 17.4442) -> (3.9688, 17.4442)
  arc A0 (3.9688, 18.1132) -> (3.5, 20) centre (-1.4093, 17.7787) ccw
  line L7 (3.9688, 0) -> (3.9688, 20) projected
  line L8 (3.9688, 18.1132) -> (3.5, 17.4442)
  line L9 (3.9688, 17.4442) -> (2.7369, 17.4442) construction
  arc A1 (3.9688, 15.5575) -> (3.5, 17.4442) centre (-1.4093, 15.2229) ccw
  line L10 (3.9688, 15.5575) -> (3.5, 14.8884)
  arc A2 (3.9688, 13.0017) -> (3.5, 14.8884) centre (-1.4093, 12.6671) ccw
  line L11 (3.9688, 13.0017) -> (3.5, 12.3326)
  arc A3 (3.9688, 10.4459) -> (3.5, 12.3326) centre (-1.4093, 10.1113) ccw
  line L12 (3.9688, 10.4459) -> (3.5, 9.7768)
  line L13 (3.5, 20) -> (3.5, 9.7768) construction
  line L14 (0, 20) -> (0, 0) construction
  point P0 (-18.54, -34)
  dimension "d38" = 2.5558
  dimension "d39" = 0
  dimension "d40" = 0
  dimension "d41" = 0
revolve "Revolution1" cut sketch "Sketch7" angle 360 about axis through (-18.54, 54, 0) along (0, -1, 0) contours L7 A0 L0
sketch "Sketch8" plane through (-18.54, 34, 0) normal (0, 0, -1) x (-1, 0, 0)
  line L0 (-3.9688, 18.1132) -> (3.9688, 18.1132) projected
  line L1 (-3.9688, 18.1132) -> (-3.5, 17.5638)
  line L2 (-3.5, 0) -> (-3.5, 20) projected
  line L3 (-3.9688, 0) -> (-3.9688, 18.1132) projected
  arc A0 (-3.5, 17.5638) -> (-3.9688, 16.0073) centre (-0.6147, 15.846) ccw
  line L4 (-3.9688, 15.6848) -> (-3.5, 15.1353)
  arc A1 (-3.5, 15.1353) -> (-3.9688, 13.7438) centre (-0.9417, 13.4988) ccw
  line L5 (-3.9688, 13.2539) -> (-3.5, 12.7044)
  arc A2 (-3.5, 12.7044) -> (-3.9688, 11.1551) centre (-0.6356, 10.9922) ccw
  line L6 (-3.9688, 10.8293) -> (-3.5, 10.2798)
  line L7 (-3.5, 20) -> (3.5, 20) construction
  line L8 (0, 20) -> (0, 6.8356) construction
  point P0 (-18.54, -34)
revolve "Revolution2" cut sketch "Sketch8" angle 360 about axis through (-18.54, 54, 0) along (0, -1, 0) contours L1 A0 L3 | A1 L3 L4 | A2 L3 L5
sketch "Sketch9" plane through (-25.5, 18.0624, -21.3331) normal (-1, 0, 0) x (0, 0, 1)
  line L0 (9.5353, 14.8707) -> (4.0266, 14.8707) construction
  line L1 (9.5353, 14.8707) -> (9.5353, 15.9376) construction
  line L2 (4.631, 15.9376) -> (38.0353, 15.9376) construction
  line L3 (9.5353, 15.9376) -> (38.0353, -18.0624) construction
  line L4 (38.0353, -18.0624) -> (38.0353, 15.9376) construction
  line L5 (38.0353, 14.8707) -> (38.0353, 12.7457) construction
  line L6 (38.0353, 15.9376) -> (9.5353, -18.0624) construction
  line L7 (38.0353, -18.0624) -> (4.631, -18.0624) construction
  circle A0 centre (21.3331, -1.0624) radius 3.5 construction
  circle A1 centre (21.3331, -1.0624) radius 3.969 construction
  circle A2 centre (21.3331, -1.0624) radius 3.5
  circle A3 centre (21.3331, -1.0624) radius 3.969
  point P0 (21.3331, -18.0624)
  dimension "d44" = 7
  dimension "d45" = 7.938
extrude "Extrusion7" add sketch "Sketch9" along normal blind 15
sketch "Sketch10" plane through (-25.5, 18.0624, -21.3331) normal (-1, 0, 0) x (0, 0, 1)
  line L0 (9.5353, 14.8707) -> (4.0266, 14.8707) construction
  line L1 (9.5353, 14.8707) -> (9.5353, 15.9376) construction
  line L2 (4.631, 15.9376) -> (38.0353, 15.9376) construction
  line L3 (9.5353, 15.9376) -> (38.0353, -18.0624) construction
  line L4 (38.0353, -18.0624) -> (38.0353, 15.9376) construction
  line L5 (38.0353, 15.9376) -> (9.5353, -18.0624) construction
  line L6 (13.0353, 15.9376) -> (13.0353, -18.0624) construction
  line L7 (34.5353, 15.9376) -> (34.5353, -18.0624) construction
  circle A0 centre (13.0353, 11.7622) radius 1.75
  circle A1 centre (34.5353, 11.7622) radius 1.75
  circle A2 centre (34.5353, -13.8869) radius 1.75
  circle A3 centre (13.0353, -13.8869) radius 1.75
  point P0 (21.3331, -18.0624)
  dimension "d48" = 3.5
  dimension "d49" = 3.5
  dimension "d50" = 3.5
  dimension "d51" = 3.5
  dimension "d52" = 3.5
  dimension "d53" = 3.5
extrude "Extrusion8" add sketch "Sketch10" along normal blind 0.75
properties part number "To Much Work, Motor"
